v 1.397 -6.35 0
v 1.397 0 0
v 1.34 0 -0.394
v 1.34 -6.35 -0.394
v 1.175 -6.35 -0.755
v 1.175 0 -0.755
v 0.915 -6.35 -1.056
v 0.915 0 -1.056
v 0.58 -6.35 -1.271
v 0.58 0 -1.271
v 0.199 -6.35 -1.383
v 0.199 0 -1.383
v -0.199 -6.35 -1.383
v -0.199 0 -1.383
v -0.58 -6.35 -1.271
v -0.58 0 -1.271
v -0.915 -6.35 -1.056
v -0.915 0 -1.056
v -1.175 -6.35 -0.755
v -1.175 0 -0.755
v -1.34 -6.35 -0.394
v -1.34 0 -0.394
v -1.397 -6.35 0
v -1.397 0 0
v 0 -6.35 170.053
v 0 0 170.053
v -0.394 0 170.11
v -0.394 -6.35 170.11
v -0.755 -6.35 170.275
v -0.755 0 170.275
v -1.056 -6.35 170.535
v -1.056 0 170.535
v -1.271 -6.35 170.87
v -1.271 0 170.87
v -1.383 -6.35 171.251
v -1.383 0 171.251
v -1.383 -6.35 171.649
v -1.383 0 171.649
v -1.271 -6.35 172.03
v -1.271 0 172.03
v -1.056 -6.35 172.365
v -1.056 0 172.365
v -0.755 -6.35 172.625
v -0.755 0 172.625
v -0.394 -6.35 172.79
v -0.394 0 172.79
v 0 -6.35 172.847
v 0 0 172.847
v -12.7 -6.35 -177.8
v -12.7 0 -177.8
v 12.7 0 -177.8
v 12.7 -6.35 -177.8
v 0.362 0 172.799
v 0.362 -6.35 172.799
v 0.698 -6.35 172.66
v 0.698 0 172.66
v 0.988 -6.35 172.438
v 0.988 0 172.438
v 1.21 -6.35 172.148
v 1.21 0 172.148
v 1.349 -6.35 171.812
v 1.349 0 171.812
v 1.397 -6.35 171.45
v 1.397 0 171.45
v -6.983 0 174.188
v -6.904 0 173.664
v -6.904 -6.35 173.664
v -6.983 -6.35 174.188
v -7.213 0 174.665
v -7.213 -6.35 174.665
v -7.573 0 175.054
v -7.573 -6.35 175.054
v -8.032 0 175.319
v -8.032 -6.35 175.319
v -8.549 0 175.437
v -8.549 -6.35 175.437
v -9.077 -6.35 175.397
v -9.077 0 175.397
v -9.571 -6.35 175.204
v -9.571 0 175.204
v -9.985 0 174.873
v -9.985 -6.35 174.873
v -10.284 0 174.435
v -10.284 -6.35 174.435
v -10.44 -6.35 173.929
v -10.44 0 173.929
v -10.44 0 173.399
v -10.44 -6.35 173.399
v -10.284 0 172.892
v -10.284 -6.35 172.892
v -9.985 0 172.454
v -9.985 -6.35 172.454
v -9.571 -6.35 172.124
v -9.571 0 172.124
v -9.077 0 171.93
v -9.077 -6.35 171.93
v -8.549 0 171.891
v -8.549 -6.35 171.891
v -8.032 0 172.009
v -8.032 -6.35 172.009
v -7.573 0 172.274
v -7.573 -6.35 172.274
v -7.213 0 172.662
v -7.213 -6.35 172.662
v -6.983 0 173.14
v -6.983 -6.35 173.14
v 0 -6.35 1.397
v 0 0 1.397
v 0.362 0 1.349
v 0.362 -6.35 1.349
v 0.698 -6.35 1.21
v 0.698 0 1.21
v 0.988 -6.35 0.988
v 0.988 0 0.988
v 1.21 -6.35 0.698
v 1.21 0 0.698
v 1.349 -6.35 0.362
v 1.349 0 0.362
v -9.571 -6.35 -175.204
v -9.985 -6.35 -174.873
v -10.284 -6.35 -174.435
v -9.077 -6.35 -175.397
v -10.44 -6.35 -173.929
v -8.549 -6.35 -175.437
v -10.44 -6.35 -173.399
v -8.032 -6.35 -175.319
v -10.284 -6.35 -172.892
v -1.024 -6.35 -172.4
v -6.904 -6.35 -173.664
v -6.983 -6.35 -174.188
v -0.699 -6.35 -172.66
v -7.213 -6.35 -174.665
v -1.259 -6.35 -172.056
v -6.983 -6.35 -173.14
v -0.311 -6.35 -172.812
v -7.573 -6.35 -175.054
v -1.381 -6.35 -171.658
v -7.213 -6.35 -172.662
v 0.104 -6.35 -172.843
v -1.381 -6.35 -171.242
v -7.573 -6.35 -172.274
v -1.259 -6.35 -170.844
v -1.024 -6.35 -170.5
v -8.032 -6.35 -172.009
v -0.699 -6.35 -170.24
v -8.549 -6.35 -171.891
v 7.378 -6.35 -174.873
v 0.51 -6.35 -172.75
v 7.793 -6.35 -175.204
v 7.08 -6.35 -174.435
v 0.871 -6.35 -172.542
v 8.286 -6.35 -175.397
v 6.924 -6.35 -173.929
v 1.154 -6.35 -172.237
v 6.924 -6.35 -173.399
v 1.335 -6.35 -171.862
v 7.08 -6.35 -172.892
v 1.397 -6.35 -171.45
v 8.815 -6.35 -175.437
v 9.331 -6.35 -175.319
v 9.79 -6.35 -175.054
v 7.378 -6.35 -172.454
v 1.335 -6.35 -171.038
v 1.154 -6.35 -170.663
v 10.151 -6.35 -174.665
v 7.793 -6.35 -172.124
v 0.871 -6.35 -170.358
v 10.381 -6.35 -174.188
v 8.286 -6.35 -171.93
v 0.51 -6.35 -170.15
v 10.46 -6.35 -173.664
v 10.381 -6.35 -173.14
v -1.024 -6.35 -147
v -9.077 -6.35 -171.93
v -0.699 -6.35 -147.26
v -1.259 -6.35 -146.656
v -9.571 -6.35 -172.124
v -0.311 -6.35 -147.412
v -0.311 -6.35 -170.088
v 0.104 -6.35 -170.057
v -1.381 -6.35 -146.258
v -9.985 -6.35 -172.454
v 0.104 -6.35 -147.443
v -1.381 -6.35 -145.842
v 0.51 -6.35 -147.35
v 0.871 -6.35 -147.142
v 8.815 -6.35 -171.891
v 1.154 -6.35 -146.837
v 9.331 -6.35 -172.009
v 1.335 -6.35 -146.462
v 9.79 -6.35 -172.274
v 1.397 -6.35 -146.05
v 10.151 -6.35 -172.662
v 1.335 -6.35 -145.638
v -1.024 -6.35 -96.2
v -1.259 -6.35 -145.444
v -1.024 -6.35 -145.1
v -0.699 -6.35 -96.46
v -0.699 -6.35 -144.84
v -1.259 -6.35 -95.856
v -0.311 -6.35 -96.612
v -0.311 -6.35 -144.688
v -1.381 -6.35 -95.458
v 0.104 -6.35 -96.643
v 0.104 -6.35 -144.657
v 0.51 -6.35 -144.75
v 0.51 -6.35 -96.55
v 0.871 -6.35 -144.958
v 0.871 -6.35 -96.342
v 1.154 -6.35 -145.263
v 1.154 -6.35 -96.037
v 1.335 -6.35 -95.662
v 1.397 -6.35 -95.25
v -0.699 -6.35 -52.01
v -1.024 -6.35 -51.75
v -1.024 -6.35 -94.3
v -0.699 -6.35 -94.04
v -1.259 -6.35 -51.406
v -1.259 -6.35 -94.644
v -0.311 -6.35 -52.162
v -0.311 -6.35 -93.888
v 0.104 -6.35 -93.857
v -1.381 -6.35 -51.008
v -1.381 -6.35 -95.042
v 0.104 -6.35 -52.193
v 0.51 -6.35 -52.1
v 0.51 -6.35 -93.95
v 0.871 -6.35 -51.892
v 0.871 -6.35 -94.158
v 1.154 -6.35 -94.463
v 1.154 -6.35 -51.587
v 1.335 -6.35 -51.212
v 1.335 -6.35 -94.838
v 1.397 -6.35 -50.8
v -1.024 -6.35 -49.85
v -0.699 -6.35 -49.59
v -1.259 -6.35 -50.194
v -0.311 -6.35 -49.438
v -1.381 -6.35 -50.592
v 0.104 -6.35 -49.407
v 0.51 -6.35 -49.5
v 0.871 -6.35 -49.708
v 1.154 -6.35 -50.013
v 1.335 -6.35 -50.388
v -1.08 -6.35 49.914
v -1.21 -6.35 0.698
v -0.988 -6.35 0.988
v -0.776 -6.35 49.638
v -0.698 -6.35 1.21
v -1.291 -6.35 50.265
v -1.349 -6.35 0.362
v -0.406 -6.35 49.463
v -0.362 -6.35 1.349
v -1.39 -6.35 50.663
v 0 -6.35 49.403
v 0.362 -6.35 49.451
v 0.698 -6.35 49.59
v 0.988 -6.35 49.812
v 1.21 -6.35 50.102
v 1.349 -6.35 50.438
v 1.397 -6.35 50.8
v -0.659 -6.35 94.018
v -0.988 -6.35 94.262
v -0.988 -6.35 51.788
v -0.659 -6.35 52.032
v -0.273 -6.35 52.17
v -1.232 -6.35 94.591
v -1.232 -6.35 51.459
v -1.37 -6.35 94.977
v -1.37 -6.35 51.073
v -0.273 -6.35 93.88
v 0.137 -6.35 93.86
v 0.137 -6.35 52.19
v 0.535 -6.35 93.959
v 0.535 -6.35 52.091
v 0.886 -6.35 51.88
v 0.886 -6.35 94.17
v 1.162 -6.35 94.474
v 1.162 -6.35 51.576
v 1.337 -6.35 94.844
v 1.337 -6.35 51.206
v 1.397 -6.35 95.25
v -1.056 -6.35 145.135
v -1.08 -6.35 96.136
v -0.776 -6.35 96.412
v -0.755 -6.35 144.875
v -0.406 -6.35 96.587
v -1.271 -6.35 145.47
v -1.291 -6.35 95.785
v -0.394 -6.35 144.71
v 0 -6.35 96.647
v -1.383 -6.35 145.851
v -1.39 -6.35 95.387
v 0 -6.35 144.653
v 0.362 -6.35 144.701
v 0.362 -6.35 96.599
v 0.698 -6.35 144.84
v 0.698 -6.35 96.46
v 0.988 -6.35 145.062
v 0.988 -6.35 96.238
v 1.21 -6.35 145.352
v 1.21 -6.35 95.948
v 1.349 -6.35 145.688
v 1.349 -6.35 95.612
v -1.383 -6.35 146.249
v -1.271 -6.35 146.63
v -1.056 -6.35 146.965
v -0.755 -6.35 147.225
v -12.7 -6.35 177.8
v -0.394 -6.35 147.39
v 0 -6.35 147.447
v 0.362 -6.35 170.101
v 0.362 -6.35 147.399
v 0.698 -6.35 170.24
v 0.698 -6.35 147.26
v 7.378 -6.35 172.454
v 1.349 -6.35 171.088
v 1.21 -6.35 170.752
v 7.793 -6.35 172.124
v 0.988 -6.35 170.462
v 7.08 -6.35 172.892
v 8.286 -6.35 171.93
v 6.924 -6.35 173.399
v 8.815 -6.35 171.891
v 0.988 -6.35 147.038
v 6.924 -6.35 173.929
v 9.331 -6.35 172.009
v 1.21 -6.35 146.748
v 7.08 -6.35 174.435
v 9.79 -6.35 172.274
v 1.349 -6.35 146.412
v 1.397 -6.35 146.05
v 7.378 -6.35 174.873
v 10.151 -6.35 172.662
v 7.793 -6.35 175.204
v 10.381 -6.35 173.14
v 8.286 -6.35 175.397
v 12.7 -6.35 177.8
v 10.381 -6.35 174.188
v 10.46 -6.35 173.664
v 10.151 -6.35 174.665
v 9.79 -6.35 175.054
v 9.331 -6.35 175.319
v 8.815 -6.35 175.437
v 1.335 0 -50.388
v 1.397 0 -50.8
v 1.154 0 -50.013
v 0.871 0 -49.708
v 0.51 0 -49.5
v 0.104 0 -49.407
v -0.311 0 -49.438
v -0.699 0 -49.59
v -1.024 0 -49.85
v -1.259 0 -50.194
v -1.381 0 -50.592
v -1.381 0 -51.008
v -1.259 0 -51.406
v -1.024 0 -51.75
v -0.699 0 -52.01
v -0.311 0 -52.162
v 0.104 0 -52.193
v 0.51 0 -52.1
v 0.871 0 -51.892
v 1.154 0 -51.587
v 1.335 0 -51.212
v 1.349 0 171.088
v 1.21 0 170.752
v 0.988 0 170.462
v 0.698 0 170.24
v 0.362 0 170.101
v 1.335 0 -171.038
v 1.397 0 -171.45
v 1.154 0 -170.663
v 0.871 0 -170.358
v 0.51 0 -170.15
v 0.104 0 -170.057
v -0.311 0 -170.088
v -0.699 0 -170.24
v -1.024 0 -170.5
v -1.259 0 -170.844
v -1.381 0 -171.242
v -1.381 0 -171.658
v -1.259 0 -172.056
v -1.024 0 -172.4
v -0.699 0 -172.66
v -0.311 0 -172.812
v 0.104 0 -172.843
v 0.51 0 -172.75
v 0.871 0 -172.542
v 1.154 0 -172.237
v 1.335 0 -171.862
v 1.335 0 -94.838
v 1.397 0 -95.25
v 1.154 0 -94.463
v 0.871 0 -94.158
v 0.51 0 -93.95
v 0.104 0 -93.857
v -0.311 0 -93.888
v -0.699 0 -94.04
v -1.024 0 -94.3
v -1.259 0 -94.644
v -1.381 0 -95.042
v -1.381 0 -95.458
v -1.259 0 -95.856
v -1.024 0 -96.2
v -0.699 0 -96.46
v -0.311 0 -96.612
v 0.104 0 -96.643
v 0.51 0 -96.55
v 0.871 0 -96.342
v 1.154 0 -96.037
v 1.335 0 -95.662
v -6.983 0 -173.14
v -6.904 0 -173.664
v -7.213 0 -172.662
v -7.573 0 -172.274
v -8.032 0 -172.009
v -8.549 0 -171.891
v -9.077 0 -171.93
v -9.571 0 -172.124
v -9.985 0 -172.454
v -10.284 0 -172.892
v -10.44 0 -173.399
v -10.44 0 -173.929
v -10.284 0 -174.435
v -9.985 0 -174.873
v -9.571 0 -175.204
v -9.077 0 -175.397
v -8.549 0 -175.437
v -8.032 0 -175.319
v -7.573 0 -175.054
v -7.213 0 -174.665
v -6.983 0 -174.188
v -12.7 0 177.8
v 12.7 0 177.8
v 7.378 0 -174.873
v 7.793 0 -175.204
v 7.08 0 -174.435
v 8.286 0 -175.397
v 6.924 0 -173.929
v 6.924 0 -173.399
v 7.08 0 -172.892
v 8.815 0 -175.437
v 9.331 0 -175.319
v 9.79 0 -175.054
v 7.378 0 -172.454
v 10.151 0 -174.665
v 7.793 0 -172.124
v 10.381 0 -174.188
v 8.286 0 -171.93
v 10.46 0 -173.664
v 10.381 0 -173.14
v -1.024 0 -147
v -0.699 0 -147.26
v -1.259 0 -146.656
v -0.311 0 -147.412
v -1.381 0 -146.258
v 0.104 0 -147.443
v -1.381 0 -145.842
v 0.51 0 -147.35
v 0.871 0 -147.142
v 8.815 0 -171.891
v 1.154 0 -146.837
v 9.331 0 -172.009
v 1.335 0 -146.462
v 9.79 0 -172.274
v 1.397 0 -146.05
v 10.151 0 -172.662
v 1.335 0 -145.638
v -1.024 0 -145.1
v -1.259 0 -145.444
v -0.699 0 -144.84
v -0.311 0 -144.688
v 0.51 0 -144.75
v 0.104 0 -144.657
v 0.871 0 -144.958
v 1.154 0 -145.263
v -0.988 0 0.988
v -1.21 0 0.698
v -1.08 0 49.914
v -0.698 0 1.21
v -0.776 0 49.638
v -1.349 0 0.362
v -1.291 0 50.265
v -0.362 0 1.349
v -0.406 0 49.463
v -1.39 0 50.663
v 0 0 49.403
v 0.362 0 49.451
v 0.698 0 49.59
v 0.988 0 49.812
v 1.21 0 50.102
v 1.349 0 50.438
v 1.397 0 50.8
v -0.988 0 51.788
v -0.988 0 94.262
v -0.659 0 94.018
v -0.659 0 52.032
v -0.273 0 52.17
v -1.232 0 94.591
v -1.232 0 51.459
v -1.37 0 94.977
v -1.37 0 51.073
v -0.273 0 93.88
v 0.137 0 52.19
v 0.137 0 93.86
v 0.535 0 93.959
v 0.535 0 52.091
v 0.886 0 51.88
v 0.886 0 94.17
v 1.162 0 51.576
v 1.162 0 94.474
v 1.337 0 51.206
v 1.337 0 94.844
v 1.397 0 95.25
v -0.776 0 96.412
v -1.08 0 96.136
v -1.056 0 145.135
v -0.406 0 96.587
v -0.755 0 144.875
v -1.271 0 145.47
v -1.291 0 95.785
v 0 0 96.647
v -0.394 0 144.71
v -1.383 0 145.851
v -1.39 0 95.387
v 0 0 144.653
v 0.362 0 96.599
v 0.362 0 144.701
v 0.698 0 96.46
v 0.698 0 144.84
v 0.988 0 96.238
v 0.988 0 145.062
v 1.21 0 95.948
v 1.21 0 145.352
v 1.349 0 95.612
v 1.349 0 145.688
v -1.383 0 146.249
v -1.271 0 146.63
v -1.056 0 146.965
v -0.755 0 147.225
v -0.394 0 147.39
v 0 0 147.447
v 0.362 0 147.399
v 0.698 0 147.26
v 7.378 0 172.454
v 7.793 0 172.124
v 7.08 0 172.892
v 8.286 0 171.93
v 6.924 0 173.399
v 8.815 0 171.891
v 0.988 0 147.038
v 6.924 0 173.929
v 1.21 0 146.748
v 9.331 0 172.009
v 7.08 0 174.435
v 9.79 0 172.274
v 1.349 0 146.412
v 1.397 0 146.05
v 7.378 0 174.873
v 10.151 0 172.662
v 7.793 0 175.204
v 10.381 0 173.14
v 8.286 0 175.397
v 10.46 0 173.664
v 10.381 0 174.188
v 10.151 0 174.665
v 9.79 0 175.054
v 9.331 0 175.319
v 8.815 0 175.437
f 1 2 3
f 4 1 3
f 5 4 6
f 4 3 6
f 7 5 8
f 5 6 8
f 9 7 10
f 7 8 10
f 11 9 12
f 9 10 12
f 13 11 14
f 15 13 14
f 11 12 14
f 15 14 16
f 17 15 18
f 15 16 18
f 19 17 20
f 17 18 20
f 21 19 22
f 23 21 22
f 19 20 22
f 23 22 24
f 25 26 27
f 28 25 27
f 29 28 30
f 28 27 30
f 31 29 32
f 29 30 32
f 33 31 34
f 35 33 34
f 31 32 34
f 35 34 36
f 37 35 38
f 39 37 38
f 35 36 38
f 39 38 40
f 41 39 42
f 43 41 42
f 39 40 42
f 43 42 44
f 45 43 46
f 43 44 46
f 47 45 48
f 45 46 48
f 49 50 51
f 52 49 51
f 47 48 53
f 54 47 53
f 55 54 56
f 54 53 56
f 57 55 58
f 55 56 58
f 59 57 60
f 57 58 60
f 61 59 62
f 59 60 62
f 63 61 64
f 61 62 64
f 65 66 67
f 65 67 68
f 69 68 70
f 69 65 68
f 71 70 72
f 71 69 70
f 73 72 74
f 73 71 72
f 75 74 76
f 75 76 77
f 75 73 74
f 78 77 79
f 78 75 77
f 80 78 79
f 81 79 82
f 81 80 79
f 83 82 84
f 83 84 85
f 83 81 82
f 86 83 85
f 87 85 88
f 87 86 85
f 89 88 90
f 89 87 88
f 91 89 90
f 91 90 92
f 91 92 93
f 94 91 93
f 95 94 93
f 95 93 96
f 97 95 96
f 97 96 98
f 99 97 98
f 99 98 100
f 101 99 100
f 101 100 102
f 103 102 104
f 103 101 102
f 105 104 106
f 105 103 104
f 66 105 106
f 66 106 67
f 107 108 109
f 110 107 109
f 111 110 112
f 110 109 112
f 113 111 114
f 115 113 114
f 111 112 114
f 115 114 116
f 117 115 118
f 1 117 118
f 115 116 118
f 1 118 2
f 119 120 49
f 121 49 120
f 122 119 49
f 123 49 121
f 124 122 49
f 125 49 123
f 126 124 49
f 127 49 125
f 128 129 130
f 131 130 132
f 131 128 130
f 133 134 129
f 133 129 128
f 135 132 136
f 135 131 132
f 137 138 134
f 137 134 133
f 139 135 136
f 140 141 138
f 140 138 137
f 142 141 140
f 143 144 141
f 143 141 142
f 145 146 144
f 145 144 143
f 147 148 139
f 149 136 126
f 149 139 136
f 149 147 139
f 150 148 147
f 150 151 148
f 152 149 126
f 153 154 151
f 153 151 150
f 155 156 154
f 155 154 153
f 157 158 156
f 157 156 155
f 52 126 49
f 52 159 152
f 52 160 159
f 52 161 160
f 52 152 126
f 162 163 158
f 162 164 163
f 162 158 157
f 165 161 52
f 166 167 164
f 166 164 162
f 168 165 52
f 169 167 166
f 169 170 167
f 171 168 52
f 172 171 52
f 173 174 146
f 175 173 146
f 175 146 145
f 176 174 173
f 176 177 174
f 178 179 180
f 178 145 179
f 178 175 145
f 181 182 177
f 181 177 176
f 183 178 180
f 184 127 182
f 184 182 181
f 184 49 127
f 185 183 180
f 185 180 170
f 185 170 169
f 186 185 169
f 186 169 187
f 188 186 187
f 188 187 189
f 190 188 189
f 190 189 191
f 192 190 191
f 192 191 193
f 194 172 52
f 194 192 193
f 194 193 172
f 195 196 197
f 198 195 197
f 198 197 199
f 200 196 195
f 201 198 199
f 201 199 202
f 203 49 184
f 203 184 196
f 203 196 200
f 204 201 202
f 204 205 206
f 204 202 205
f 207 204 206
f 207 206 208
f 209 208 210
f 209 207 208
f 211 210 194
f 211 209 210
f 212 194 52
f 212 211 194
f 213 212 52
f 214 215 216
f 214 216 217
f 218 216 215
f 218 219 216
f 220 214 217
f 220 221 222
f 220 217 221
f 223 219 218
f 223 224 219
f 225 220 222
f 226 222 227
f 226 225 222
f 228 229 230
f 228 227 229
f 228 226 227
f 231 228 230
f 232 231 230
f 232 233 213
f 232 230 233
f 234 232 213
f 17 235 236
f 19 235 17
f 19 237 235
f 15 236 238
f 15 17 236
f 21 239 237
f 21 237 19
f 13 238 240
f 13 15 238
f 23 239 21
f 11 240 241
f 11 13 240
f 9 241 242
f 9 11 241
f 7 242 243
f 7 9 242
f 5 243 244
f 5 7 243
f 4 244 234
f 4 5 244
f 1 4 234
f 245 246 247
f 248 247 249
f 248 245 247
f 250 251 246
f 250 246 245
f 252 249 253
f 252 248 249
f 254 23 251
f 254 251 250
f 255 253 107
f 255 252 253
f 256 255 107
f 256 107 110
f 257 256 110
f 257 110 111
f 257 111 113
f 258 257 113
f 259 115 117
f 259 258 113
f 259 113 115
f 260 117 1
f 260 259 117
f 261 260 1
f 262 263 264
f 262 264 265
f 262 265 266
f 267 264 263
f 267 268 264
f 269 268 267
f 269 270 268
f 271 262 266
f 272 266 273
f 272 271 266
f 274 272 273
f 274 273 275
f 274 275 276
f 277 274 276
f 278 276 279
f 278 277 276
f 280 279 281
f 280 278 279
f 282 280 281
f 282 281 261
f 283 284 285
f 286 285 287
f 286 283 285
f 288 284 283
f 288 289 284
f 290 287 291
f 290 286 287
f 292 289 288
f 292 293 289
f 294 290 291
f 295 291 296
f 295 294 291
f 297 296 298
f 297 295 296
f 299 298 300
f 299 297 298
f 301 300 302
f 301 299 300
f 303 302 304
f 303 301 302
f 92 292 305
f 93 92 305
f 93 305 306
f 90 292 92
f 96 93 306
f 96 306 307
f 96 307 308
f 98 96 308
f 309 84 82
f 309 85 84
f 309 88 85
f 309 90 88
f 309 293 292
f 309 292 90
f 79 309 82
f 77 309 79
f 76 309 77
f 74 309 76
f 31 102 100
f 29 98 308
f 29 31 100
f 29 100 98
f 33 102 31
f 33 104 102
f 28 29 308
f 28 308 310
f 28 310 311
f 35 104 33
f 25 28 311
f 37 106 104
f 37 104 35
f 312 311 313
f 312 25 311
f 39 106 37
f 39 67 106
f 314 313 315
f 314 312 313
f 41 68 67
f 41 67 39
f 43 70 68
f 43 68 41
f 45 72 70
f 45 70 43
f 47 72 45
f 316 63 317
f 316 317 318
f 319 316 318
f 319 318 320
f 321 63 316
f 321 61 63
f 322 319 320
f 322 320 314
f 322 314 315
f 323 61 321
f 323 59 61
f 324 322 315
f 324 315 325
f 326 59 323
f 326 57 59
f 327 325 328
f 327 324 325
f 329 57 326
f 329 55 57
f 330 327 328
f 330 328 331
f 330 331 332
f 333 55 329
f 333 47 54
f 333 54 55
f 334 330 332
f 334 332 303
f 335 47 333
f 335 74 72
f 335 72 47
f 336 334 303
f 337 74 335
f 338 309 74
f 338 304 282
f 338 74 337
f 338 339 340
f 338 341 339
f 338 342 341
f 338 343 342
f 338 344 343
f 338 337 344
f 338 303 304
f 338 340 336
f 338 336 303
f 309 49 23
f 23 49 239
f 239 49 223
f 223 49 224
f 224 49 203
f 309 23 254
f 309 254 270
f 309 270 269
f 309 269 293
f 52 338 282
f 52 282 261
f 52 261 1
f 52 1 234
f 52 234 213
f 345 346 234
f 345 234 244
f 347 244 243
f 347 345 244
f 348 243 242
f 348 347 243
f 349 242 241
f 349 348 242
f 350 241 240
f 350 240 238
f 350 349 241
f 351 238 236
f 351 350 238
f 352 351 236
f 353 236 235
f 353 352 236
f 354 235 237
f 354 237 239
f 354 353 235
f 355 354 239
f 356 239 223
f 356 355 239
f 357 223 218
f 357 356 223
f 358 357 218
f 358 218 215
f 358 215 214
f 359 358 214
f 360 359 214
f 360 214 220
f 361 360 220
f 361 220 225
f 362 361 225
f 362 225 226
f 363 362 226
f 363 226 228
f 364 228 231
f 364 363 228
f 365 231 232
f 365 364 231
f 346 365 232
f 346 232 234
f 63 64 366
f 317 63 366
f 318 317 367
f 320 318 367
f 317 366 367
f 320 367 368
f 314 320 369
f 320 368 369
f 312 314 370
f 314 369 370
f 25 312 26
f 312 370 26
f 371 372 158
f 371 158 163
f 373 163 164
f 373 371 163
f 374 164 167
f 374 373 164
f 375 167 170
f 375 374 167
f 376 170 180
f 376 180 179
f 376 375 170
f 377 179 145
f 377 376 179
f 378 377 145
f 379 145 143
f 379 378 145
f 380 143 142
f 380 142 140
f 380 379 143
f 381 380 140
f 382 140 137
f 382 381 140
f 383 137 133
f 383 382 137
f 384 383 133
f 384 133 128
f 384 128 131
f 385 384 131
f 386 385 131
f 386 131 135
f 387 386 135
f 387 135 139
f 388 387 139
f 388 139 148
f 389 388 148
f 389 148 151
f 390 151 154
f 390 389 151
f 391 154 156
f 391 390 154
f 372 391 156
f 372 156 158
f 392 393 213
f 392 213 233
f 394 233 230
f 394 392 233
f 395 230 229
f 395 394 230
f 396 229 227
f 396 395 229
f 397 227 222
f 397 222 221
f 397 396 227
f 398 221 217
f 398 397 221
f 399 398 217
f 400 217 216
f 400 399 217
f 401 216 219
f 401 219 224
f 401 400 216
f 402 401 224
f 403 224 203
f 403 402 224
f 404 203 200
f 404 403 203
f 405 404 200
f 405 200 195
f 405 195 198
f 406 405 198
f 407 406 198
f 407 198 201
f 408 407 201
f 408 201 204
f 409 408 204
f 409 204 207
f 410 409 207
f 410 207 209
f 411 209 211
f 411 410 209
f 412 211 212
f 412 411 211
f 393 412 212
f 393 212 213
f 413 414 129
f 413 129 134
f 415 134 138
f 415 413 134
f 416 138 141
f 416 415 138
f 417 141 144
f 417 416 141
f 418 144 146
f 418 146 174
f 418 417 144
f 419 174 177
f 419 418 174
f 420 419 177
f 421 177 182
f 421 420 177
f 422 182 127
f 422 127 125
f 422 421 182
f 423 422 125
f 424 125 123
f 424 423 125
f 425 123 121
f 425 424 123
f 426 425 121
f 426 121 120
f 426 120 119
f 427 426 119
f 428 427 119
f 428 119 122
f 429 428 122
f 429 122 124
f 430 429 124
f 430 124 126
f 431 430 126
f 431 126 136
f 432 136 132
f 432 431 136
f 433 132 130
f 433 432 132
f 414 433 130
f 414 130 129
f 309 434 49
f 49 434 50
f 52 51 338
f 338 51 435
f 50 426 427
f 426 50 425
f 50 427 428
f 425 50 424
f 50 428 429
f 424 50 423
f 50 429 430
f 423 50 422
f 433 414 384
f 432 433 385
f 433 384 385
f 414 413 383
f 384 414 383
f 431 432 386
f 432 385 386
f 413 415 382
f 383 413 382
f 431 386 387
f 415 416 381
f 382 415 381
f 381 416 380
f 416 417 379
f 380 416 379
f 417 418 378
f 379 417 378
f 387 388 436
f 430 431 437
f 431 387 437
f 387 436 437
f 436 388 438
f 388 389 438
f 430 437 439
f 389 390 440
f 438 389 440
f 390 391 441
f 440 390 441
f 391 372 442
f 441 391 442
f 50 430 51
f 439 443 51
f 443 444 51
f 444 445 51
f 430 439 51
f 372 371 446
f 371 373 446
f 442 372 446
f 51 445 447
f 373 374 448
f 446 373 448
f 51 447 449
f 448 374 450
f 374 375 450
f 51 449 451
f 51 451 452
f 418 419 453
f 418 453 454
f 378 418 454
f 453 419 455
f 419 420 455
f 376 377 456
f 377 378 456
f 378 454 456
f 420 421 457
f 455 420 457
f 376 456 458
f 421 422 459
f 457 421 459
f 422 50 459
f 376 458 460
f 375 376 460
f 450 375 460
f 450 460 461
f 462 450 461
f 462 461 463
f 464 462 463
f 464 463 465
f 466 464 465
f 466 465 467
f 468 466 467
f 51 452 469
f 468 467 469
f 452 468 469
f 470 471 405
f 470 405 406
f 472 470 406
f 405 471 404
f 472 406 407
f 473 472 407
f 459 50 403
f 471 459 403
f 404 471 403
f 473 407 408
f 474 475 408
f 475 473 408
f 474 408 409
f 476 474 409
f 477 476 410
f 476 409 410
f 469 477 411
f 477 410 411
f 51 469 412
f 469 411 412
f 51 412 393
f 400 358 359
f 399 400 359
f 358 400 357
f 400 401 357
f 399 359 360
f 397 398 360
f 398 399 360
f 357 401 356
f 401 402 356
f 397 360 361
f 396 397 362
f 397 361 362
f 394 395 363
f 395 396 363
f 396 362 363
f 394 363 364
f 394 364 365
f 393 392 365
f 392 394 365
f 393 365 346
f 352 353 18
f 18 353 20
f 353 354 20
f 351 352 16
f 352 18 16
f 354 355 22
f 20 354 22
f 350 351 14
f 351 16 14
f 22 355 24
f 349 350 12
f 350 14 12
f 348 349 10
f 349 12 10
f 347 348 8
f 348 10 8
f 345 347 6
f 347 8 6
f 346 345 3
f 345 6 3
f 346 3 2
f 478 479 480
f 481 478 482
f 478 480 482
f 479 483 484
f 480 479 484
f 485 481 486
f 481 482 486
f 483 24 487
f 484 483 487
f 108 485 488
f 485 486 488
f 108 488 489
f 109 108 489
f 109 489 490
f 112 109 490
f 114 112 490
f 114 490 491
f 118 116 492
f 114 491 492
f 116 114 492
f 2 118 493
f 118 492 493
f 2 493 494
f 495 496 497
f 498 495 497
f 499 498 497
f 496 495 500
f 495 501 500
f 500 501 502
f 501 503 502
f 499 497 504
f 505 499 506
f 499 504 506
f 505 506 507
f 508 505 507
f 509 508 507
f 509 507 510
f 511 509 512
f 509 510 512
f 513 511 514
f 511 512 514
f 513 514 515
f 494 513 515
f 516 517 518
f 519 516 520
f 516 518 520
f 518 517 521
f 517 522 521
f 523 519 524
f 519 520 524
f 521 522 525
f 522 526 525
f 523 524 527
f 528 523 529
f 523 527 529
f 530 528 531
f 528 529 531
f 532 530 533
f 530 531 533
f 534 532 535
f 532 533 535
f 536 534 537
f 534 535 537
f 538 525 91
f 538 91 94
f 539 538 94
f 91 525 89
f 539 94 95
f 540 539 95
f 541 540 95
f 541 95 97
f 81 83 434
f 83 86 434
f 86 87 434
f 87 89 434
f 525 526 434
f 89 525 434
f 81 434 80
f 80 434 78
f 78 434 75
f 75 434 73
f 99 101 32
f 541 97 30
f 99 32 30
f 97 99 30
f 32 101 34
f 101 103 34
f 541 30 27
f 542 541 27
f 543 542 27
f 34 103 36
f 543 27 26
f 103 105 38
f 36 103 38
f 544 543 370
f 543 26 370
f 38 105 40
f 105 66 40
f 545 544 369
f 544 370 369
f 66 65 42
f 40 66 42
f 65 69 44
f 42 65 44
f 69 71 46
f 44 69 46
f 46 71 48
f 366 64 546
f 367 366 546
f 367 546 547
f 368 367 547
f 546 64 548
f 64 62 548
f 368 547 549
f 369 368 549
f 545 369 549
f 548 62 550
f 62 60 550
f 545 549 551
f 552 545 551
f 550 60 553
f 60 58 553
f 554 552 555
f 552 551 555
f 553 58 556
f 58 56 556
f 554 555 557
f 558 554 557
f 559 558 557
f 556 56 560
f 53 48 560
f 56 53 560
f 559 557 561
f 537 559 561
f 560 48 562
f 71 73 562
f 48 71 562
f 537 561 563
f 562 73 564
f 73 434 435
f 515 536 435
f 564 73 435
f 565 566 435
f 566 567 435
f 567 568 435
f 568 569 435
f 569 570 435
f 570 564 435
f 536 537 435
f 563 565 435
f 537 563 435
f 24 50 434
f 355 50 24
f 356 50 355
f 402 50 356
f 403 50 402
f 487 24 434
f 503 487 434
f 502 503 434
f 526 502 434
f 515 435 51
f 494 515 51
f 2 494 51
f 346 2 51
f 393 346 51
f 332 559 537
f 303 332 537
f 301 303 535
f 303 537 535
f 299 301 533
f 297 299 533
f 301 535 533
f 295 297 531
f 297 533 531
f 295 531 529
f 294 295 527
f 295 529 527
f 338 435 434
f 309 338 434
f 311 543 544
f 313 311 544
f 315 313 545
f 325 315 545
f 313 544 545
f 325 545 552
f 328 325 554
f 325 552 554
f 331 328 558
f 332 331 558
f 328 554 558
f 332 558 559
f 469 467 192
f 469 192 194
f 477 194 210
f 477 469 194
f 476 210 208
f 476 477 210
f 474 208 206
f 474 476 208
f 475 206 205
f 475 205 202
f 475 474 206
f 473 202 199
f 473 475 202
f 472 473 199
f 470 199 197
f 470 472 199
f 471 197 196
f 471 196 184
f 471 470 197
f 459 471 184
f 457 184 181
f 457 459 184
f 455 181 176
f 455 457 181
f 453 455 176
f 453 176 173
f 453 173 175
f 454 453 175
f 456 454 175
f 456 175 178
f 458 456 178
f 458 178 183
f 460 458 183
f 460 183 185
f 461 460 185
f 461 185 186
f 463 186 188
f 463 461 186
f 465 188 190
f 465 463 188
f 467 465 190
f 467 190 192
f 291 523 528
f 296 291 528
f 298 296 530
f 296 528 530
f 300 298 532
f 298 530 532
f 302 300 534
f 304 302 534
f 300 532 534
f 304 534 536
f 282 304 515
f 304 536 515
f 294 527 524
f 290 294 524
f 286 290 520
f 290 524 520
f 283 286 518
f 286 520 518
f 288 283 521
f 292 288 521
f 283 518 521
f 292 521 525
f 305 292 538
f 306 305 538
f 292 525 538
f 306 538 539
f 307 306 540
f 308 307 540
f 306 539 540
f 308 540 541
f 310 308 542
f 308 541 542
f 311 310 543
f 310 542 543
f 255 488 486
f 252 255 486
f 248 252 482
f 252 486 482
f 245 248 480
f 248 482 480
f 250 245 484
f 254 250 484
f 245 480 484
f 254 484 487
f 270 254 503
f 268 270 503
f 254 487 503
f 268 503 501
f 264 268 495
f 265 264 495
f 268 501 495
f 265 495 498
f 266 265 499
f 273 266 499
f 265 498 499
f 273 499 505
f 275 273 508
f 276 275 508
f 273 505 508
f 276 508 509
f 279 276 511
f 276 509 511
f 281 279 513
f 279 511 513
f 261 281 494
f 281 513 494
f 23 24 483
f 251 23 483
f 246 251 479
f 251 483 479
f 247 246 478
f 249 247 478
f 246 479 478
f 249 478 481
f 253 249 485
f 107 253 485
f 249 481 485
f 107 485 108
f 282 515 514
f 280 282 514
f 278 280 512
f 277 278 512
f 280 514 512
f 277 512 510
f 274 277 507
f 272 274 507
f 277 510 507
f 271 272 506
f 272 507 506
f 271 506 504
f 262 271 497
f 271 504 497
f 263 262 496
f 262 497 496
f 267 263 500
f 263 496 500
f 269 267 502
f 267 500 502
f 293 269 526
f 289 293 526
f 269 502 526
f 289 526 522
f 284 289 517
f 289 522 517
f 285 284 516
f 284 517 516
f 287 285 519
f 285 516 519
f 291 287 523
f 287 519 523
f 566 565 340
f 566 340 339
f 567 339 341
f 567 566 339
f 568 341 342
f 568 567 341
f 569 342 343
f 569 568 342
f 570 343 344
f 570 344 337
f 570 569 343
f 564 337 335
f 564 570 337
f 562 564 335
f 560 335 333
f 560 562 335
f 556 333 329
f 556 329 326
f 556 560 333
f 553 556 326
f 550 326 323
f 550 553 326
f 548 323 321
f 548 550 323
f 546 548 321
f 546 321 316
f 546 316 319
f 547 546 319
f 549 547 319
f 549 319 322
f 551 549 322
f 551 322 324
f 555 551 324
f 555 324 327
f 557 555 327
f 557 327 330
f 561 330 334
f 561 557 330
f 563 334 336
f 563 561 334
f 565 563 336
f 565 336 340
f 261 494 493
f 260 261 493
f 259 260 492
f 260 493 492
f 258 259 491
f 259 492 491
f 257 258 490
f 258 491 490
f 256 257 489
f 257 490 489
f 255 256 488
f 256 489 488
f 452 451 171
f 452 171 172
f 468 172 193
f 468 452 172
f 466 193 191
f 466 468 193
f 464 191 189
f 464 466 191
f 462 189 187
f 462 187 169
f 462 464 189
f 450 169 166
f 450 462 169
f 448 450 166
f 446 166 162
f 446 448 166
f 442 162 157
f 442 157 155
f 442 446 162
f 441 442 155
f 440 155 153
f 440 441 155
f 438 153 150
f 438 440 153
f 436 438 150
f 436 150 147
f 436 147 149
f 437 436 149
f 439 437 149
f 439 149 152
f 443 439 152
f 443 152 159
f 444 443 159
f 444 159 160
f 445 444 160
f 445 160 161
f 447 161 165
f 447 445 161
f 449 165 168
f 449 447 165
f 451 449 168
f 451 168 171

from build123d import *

# Parameters (mm, degrees)
F0_R     = 1.778
F0_R_2   = 1.397
F1_DEPTH = 6.35


with BuildPart() as f1:
    # F0 (on Front) → F1 (new body)
    with BuildSketch(Plane.XZ):
        with BuildLine():
            ThreePointArc((1.397, 95.25), (0.987828, 96.237828), (0, 96.647))
            ThreePointArc((0, 96.647), (-0.987828, 94.262172), (1.397, 95.25))
        make_face()
        with BuildLine():
            ThreePointArc((1.397, 50.8), (-0.987828, 51.787828), (0, 49.403))
            ThreePointArc((0, 49.403), (0.987828, 49.812172), (1.397, 50.8))
        make_face()
        with BuildLine():
            Line((12.7, 0), (12.7, 177.8))
            Line((12.7, 177.8), (0, 177.8))
            Line((0, 177.8), (-12.7, 177.8))
            Line((-12.7, 177.8), (-12.7, 0))
            Line((-12.7, 0), (-1.397, 0))
            ThreePointArc((-1.397, 0), (-0.987828, 0.987828), (0, 1.397))
            ThreePointArc((0, 1.397), (0.987828, 0.987828), (1.397, 0))
            Line((1.397, 0), (12.7, 0))
        make_face()
        with BuildLine():
            ThreePointArc((1.397, 50.8), (0.987828, 49.812172), (0, 49.403))
            ThreePointArc((0, 49.403), (-0.987828, 51.787828), (1.397, 50.8))
        make_face(mode=Mode.SUBTRACT)
        with Locations((-8.681838, 173.663765)):
            Circle(F0_R, mode=Mode.SUBTRACT)
        with BuildLine():
            ThreePointArc((1.397, 95.25), (-0.987828, 94.262172), (0, 96.647))
            ThreePointArc((0, 96.647), (0.987828, 96.237828), (1.397, 95.25))
        make_face(mode=Mode.SUBTRACT)
        with BuildLine():
            ThreePointArc((0, 144.653), (-1.397, 146.05), (0, 147.447))
            ThreePointArc((0, 147.447), (0.987828, 147.037828), (1.397, 146.05))
            ThreePointArc((1.397, 146.05), (0.987828, 145.062172), (0, 144.653))
        make_face(mode=Mode.SUBTRACT)
        with BuildLine():
            ThreePointArc((0, 170.053), (-1.397, 171.45), (0, 172.847))
            ThreePointArc((0, 172.847), (0.987828, 172.437828), (1.397, 171.45))
            ThreePointArc((1.397, 171.45), (0.987828, 170.462172), (0, 170.053))
        make_face(mode=Mode.SUBTRACT)
        with Locations((8.681838, 173.663765)):
            Circle(F0_R, mode=Mode.SUBTRACT)
        with BuildLine():
            Line((12.7, -177.8), (12.7, 0))
            Line((12.7, 0), (1.397, 0))
            ThreePointArc((1.397, 0), (0, -1.397), (-1.397, 0))
            Line((-1.397, 0), (-12.7, 0))
            Line((-12.7, 0), (-12.7, -177.8))
            Line((-12.7, -177.8), (12.7, -177.8))
        make_face()
        with Locations((-8.681838, -173.663765)):
            Circle(F0_R, mode=Mode.SUBTRACT)
        with Locations((0, -171.45)):
            Circle(F0_R_2, mode=Mode.SUBTRACT)
        with Locations((0, -146.05)):
            Circle(F0_R_2, mode=Mode.SUBTRACT)
        with Locations((0, -95.25)):
            Circle(F0_R_2, mode=Mode.SUBTRACT)
        with Locations((0, -50.8)):
            Circle(F0_R_2, mode=Mode.SUBTRACT)
        with Locations((8.681838, -173.663765)):
            Circle(F0_R, mode=Mode.SUBTRACT)
    extrude(amount=F1_DEPTH)


solid = f1.part
